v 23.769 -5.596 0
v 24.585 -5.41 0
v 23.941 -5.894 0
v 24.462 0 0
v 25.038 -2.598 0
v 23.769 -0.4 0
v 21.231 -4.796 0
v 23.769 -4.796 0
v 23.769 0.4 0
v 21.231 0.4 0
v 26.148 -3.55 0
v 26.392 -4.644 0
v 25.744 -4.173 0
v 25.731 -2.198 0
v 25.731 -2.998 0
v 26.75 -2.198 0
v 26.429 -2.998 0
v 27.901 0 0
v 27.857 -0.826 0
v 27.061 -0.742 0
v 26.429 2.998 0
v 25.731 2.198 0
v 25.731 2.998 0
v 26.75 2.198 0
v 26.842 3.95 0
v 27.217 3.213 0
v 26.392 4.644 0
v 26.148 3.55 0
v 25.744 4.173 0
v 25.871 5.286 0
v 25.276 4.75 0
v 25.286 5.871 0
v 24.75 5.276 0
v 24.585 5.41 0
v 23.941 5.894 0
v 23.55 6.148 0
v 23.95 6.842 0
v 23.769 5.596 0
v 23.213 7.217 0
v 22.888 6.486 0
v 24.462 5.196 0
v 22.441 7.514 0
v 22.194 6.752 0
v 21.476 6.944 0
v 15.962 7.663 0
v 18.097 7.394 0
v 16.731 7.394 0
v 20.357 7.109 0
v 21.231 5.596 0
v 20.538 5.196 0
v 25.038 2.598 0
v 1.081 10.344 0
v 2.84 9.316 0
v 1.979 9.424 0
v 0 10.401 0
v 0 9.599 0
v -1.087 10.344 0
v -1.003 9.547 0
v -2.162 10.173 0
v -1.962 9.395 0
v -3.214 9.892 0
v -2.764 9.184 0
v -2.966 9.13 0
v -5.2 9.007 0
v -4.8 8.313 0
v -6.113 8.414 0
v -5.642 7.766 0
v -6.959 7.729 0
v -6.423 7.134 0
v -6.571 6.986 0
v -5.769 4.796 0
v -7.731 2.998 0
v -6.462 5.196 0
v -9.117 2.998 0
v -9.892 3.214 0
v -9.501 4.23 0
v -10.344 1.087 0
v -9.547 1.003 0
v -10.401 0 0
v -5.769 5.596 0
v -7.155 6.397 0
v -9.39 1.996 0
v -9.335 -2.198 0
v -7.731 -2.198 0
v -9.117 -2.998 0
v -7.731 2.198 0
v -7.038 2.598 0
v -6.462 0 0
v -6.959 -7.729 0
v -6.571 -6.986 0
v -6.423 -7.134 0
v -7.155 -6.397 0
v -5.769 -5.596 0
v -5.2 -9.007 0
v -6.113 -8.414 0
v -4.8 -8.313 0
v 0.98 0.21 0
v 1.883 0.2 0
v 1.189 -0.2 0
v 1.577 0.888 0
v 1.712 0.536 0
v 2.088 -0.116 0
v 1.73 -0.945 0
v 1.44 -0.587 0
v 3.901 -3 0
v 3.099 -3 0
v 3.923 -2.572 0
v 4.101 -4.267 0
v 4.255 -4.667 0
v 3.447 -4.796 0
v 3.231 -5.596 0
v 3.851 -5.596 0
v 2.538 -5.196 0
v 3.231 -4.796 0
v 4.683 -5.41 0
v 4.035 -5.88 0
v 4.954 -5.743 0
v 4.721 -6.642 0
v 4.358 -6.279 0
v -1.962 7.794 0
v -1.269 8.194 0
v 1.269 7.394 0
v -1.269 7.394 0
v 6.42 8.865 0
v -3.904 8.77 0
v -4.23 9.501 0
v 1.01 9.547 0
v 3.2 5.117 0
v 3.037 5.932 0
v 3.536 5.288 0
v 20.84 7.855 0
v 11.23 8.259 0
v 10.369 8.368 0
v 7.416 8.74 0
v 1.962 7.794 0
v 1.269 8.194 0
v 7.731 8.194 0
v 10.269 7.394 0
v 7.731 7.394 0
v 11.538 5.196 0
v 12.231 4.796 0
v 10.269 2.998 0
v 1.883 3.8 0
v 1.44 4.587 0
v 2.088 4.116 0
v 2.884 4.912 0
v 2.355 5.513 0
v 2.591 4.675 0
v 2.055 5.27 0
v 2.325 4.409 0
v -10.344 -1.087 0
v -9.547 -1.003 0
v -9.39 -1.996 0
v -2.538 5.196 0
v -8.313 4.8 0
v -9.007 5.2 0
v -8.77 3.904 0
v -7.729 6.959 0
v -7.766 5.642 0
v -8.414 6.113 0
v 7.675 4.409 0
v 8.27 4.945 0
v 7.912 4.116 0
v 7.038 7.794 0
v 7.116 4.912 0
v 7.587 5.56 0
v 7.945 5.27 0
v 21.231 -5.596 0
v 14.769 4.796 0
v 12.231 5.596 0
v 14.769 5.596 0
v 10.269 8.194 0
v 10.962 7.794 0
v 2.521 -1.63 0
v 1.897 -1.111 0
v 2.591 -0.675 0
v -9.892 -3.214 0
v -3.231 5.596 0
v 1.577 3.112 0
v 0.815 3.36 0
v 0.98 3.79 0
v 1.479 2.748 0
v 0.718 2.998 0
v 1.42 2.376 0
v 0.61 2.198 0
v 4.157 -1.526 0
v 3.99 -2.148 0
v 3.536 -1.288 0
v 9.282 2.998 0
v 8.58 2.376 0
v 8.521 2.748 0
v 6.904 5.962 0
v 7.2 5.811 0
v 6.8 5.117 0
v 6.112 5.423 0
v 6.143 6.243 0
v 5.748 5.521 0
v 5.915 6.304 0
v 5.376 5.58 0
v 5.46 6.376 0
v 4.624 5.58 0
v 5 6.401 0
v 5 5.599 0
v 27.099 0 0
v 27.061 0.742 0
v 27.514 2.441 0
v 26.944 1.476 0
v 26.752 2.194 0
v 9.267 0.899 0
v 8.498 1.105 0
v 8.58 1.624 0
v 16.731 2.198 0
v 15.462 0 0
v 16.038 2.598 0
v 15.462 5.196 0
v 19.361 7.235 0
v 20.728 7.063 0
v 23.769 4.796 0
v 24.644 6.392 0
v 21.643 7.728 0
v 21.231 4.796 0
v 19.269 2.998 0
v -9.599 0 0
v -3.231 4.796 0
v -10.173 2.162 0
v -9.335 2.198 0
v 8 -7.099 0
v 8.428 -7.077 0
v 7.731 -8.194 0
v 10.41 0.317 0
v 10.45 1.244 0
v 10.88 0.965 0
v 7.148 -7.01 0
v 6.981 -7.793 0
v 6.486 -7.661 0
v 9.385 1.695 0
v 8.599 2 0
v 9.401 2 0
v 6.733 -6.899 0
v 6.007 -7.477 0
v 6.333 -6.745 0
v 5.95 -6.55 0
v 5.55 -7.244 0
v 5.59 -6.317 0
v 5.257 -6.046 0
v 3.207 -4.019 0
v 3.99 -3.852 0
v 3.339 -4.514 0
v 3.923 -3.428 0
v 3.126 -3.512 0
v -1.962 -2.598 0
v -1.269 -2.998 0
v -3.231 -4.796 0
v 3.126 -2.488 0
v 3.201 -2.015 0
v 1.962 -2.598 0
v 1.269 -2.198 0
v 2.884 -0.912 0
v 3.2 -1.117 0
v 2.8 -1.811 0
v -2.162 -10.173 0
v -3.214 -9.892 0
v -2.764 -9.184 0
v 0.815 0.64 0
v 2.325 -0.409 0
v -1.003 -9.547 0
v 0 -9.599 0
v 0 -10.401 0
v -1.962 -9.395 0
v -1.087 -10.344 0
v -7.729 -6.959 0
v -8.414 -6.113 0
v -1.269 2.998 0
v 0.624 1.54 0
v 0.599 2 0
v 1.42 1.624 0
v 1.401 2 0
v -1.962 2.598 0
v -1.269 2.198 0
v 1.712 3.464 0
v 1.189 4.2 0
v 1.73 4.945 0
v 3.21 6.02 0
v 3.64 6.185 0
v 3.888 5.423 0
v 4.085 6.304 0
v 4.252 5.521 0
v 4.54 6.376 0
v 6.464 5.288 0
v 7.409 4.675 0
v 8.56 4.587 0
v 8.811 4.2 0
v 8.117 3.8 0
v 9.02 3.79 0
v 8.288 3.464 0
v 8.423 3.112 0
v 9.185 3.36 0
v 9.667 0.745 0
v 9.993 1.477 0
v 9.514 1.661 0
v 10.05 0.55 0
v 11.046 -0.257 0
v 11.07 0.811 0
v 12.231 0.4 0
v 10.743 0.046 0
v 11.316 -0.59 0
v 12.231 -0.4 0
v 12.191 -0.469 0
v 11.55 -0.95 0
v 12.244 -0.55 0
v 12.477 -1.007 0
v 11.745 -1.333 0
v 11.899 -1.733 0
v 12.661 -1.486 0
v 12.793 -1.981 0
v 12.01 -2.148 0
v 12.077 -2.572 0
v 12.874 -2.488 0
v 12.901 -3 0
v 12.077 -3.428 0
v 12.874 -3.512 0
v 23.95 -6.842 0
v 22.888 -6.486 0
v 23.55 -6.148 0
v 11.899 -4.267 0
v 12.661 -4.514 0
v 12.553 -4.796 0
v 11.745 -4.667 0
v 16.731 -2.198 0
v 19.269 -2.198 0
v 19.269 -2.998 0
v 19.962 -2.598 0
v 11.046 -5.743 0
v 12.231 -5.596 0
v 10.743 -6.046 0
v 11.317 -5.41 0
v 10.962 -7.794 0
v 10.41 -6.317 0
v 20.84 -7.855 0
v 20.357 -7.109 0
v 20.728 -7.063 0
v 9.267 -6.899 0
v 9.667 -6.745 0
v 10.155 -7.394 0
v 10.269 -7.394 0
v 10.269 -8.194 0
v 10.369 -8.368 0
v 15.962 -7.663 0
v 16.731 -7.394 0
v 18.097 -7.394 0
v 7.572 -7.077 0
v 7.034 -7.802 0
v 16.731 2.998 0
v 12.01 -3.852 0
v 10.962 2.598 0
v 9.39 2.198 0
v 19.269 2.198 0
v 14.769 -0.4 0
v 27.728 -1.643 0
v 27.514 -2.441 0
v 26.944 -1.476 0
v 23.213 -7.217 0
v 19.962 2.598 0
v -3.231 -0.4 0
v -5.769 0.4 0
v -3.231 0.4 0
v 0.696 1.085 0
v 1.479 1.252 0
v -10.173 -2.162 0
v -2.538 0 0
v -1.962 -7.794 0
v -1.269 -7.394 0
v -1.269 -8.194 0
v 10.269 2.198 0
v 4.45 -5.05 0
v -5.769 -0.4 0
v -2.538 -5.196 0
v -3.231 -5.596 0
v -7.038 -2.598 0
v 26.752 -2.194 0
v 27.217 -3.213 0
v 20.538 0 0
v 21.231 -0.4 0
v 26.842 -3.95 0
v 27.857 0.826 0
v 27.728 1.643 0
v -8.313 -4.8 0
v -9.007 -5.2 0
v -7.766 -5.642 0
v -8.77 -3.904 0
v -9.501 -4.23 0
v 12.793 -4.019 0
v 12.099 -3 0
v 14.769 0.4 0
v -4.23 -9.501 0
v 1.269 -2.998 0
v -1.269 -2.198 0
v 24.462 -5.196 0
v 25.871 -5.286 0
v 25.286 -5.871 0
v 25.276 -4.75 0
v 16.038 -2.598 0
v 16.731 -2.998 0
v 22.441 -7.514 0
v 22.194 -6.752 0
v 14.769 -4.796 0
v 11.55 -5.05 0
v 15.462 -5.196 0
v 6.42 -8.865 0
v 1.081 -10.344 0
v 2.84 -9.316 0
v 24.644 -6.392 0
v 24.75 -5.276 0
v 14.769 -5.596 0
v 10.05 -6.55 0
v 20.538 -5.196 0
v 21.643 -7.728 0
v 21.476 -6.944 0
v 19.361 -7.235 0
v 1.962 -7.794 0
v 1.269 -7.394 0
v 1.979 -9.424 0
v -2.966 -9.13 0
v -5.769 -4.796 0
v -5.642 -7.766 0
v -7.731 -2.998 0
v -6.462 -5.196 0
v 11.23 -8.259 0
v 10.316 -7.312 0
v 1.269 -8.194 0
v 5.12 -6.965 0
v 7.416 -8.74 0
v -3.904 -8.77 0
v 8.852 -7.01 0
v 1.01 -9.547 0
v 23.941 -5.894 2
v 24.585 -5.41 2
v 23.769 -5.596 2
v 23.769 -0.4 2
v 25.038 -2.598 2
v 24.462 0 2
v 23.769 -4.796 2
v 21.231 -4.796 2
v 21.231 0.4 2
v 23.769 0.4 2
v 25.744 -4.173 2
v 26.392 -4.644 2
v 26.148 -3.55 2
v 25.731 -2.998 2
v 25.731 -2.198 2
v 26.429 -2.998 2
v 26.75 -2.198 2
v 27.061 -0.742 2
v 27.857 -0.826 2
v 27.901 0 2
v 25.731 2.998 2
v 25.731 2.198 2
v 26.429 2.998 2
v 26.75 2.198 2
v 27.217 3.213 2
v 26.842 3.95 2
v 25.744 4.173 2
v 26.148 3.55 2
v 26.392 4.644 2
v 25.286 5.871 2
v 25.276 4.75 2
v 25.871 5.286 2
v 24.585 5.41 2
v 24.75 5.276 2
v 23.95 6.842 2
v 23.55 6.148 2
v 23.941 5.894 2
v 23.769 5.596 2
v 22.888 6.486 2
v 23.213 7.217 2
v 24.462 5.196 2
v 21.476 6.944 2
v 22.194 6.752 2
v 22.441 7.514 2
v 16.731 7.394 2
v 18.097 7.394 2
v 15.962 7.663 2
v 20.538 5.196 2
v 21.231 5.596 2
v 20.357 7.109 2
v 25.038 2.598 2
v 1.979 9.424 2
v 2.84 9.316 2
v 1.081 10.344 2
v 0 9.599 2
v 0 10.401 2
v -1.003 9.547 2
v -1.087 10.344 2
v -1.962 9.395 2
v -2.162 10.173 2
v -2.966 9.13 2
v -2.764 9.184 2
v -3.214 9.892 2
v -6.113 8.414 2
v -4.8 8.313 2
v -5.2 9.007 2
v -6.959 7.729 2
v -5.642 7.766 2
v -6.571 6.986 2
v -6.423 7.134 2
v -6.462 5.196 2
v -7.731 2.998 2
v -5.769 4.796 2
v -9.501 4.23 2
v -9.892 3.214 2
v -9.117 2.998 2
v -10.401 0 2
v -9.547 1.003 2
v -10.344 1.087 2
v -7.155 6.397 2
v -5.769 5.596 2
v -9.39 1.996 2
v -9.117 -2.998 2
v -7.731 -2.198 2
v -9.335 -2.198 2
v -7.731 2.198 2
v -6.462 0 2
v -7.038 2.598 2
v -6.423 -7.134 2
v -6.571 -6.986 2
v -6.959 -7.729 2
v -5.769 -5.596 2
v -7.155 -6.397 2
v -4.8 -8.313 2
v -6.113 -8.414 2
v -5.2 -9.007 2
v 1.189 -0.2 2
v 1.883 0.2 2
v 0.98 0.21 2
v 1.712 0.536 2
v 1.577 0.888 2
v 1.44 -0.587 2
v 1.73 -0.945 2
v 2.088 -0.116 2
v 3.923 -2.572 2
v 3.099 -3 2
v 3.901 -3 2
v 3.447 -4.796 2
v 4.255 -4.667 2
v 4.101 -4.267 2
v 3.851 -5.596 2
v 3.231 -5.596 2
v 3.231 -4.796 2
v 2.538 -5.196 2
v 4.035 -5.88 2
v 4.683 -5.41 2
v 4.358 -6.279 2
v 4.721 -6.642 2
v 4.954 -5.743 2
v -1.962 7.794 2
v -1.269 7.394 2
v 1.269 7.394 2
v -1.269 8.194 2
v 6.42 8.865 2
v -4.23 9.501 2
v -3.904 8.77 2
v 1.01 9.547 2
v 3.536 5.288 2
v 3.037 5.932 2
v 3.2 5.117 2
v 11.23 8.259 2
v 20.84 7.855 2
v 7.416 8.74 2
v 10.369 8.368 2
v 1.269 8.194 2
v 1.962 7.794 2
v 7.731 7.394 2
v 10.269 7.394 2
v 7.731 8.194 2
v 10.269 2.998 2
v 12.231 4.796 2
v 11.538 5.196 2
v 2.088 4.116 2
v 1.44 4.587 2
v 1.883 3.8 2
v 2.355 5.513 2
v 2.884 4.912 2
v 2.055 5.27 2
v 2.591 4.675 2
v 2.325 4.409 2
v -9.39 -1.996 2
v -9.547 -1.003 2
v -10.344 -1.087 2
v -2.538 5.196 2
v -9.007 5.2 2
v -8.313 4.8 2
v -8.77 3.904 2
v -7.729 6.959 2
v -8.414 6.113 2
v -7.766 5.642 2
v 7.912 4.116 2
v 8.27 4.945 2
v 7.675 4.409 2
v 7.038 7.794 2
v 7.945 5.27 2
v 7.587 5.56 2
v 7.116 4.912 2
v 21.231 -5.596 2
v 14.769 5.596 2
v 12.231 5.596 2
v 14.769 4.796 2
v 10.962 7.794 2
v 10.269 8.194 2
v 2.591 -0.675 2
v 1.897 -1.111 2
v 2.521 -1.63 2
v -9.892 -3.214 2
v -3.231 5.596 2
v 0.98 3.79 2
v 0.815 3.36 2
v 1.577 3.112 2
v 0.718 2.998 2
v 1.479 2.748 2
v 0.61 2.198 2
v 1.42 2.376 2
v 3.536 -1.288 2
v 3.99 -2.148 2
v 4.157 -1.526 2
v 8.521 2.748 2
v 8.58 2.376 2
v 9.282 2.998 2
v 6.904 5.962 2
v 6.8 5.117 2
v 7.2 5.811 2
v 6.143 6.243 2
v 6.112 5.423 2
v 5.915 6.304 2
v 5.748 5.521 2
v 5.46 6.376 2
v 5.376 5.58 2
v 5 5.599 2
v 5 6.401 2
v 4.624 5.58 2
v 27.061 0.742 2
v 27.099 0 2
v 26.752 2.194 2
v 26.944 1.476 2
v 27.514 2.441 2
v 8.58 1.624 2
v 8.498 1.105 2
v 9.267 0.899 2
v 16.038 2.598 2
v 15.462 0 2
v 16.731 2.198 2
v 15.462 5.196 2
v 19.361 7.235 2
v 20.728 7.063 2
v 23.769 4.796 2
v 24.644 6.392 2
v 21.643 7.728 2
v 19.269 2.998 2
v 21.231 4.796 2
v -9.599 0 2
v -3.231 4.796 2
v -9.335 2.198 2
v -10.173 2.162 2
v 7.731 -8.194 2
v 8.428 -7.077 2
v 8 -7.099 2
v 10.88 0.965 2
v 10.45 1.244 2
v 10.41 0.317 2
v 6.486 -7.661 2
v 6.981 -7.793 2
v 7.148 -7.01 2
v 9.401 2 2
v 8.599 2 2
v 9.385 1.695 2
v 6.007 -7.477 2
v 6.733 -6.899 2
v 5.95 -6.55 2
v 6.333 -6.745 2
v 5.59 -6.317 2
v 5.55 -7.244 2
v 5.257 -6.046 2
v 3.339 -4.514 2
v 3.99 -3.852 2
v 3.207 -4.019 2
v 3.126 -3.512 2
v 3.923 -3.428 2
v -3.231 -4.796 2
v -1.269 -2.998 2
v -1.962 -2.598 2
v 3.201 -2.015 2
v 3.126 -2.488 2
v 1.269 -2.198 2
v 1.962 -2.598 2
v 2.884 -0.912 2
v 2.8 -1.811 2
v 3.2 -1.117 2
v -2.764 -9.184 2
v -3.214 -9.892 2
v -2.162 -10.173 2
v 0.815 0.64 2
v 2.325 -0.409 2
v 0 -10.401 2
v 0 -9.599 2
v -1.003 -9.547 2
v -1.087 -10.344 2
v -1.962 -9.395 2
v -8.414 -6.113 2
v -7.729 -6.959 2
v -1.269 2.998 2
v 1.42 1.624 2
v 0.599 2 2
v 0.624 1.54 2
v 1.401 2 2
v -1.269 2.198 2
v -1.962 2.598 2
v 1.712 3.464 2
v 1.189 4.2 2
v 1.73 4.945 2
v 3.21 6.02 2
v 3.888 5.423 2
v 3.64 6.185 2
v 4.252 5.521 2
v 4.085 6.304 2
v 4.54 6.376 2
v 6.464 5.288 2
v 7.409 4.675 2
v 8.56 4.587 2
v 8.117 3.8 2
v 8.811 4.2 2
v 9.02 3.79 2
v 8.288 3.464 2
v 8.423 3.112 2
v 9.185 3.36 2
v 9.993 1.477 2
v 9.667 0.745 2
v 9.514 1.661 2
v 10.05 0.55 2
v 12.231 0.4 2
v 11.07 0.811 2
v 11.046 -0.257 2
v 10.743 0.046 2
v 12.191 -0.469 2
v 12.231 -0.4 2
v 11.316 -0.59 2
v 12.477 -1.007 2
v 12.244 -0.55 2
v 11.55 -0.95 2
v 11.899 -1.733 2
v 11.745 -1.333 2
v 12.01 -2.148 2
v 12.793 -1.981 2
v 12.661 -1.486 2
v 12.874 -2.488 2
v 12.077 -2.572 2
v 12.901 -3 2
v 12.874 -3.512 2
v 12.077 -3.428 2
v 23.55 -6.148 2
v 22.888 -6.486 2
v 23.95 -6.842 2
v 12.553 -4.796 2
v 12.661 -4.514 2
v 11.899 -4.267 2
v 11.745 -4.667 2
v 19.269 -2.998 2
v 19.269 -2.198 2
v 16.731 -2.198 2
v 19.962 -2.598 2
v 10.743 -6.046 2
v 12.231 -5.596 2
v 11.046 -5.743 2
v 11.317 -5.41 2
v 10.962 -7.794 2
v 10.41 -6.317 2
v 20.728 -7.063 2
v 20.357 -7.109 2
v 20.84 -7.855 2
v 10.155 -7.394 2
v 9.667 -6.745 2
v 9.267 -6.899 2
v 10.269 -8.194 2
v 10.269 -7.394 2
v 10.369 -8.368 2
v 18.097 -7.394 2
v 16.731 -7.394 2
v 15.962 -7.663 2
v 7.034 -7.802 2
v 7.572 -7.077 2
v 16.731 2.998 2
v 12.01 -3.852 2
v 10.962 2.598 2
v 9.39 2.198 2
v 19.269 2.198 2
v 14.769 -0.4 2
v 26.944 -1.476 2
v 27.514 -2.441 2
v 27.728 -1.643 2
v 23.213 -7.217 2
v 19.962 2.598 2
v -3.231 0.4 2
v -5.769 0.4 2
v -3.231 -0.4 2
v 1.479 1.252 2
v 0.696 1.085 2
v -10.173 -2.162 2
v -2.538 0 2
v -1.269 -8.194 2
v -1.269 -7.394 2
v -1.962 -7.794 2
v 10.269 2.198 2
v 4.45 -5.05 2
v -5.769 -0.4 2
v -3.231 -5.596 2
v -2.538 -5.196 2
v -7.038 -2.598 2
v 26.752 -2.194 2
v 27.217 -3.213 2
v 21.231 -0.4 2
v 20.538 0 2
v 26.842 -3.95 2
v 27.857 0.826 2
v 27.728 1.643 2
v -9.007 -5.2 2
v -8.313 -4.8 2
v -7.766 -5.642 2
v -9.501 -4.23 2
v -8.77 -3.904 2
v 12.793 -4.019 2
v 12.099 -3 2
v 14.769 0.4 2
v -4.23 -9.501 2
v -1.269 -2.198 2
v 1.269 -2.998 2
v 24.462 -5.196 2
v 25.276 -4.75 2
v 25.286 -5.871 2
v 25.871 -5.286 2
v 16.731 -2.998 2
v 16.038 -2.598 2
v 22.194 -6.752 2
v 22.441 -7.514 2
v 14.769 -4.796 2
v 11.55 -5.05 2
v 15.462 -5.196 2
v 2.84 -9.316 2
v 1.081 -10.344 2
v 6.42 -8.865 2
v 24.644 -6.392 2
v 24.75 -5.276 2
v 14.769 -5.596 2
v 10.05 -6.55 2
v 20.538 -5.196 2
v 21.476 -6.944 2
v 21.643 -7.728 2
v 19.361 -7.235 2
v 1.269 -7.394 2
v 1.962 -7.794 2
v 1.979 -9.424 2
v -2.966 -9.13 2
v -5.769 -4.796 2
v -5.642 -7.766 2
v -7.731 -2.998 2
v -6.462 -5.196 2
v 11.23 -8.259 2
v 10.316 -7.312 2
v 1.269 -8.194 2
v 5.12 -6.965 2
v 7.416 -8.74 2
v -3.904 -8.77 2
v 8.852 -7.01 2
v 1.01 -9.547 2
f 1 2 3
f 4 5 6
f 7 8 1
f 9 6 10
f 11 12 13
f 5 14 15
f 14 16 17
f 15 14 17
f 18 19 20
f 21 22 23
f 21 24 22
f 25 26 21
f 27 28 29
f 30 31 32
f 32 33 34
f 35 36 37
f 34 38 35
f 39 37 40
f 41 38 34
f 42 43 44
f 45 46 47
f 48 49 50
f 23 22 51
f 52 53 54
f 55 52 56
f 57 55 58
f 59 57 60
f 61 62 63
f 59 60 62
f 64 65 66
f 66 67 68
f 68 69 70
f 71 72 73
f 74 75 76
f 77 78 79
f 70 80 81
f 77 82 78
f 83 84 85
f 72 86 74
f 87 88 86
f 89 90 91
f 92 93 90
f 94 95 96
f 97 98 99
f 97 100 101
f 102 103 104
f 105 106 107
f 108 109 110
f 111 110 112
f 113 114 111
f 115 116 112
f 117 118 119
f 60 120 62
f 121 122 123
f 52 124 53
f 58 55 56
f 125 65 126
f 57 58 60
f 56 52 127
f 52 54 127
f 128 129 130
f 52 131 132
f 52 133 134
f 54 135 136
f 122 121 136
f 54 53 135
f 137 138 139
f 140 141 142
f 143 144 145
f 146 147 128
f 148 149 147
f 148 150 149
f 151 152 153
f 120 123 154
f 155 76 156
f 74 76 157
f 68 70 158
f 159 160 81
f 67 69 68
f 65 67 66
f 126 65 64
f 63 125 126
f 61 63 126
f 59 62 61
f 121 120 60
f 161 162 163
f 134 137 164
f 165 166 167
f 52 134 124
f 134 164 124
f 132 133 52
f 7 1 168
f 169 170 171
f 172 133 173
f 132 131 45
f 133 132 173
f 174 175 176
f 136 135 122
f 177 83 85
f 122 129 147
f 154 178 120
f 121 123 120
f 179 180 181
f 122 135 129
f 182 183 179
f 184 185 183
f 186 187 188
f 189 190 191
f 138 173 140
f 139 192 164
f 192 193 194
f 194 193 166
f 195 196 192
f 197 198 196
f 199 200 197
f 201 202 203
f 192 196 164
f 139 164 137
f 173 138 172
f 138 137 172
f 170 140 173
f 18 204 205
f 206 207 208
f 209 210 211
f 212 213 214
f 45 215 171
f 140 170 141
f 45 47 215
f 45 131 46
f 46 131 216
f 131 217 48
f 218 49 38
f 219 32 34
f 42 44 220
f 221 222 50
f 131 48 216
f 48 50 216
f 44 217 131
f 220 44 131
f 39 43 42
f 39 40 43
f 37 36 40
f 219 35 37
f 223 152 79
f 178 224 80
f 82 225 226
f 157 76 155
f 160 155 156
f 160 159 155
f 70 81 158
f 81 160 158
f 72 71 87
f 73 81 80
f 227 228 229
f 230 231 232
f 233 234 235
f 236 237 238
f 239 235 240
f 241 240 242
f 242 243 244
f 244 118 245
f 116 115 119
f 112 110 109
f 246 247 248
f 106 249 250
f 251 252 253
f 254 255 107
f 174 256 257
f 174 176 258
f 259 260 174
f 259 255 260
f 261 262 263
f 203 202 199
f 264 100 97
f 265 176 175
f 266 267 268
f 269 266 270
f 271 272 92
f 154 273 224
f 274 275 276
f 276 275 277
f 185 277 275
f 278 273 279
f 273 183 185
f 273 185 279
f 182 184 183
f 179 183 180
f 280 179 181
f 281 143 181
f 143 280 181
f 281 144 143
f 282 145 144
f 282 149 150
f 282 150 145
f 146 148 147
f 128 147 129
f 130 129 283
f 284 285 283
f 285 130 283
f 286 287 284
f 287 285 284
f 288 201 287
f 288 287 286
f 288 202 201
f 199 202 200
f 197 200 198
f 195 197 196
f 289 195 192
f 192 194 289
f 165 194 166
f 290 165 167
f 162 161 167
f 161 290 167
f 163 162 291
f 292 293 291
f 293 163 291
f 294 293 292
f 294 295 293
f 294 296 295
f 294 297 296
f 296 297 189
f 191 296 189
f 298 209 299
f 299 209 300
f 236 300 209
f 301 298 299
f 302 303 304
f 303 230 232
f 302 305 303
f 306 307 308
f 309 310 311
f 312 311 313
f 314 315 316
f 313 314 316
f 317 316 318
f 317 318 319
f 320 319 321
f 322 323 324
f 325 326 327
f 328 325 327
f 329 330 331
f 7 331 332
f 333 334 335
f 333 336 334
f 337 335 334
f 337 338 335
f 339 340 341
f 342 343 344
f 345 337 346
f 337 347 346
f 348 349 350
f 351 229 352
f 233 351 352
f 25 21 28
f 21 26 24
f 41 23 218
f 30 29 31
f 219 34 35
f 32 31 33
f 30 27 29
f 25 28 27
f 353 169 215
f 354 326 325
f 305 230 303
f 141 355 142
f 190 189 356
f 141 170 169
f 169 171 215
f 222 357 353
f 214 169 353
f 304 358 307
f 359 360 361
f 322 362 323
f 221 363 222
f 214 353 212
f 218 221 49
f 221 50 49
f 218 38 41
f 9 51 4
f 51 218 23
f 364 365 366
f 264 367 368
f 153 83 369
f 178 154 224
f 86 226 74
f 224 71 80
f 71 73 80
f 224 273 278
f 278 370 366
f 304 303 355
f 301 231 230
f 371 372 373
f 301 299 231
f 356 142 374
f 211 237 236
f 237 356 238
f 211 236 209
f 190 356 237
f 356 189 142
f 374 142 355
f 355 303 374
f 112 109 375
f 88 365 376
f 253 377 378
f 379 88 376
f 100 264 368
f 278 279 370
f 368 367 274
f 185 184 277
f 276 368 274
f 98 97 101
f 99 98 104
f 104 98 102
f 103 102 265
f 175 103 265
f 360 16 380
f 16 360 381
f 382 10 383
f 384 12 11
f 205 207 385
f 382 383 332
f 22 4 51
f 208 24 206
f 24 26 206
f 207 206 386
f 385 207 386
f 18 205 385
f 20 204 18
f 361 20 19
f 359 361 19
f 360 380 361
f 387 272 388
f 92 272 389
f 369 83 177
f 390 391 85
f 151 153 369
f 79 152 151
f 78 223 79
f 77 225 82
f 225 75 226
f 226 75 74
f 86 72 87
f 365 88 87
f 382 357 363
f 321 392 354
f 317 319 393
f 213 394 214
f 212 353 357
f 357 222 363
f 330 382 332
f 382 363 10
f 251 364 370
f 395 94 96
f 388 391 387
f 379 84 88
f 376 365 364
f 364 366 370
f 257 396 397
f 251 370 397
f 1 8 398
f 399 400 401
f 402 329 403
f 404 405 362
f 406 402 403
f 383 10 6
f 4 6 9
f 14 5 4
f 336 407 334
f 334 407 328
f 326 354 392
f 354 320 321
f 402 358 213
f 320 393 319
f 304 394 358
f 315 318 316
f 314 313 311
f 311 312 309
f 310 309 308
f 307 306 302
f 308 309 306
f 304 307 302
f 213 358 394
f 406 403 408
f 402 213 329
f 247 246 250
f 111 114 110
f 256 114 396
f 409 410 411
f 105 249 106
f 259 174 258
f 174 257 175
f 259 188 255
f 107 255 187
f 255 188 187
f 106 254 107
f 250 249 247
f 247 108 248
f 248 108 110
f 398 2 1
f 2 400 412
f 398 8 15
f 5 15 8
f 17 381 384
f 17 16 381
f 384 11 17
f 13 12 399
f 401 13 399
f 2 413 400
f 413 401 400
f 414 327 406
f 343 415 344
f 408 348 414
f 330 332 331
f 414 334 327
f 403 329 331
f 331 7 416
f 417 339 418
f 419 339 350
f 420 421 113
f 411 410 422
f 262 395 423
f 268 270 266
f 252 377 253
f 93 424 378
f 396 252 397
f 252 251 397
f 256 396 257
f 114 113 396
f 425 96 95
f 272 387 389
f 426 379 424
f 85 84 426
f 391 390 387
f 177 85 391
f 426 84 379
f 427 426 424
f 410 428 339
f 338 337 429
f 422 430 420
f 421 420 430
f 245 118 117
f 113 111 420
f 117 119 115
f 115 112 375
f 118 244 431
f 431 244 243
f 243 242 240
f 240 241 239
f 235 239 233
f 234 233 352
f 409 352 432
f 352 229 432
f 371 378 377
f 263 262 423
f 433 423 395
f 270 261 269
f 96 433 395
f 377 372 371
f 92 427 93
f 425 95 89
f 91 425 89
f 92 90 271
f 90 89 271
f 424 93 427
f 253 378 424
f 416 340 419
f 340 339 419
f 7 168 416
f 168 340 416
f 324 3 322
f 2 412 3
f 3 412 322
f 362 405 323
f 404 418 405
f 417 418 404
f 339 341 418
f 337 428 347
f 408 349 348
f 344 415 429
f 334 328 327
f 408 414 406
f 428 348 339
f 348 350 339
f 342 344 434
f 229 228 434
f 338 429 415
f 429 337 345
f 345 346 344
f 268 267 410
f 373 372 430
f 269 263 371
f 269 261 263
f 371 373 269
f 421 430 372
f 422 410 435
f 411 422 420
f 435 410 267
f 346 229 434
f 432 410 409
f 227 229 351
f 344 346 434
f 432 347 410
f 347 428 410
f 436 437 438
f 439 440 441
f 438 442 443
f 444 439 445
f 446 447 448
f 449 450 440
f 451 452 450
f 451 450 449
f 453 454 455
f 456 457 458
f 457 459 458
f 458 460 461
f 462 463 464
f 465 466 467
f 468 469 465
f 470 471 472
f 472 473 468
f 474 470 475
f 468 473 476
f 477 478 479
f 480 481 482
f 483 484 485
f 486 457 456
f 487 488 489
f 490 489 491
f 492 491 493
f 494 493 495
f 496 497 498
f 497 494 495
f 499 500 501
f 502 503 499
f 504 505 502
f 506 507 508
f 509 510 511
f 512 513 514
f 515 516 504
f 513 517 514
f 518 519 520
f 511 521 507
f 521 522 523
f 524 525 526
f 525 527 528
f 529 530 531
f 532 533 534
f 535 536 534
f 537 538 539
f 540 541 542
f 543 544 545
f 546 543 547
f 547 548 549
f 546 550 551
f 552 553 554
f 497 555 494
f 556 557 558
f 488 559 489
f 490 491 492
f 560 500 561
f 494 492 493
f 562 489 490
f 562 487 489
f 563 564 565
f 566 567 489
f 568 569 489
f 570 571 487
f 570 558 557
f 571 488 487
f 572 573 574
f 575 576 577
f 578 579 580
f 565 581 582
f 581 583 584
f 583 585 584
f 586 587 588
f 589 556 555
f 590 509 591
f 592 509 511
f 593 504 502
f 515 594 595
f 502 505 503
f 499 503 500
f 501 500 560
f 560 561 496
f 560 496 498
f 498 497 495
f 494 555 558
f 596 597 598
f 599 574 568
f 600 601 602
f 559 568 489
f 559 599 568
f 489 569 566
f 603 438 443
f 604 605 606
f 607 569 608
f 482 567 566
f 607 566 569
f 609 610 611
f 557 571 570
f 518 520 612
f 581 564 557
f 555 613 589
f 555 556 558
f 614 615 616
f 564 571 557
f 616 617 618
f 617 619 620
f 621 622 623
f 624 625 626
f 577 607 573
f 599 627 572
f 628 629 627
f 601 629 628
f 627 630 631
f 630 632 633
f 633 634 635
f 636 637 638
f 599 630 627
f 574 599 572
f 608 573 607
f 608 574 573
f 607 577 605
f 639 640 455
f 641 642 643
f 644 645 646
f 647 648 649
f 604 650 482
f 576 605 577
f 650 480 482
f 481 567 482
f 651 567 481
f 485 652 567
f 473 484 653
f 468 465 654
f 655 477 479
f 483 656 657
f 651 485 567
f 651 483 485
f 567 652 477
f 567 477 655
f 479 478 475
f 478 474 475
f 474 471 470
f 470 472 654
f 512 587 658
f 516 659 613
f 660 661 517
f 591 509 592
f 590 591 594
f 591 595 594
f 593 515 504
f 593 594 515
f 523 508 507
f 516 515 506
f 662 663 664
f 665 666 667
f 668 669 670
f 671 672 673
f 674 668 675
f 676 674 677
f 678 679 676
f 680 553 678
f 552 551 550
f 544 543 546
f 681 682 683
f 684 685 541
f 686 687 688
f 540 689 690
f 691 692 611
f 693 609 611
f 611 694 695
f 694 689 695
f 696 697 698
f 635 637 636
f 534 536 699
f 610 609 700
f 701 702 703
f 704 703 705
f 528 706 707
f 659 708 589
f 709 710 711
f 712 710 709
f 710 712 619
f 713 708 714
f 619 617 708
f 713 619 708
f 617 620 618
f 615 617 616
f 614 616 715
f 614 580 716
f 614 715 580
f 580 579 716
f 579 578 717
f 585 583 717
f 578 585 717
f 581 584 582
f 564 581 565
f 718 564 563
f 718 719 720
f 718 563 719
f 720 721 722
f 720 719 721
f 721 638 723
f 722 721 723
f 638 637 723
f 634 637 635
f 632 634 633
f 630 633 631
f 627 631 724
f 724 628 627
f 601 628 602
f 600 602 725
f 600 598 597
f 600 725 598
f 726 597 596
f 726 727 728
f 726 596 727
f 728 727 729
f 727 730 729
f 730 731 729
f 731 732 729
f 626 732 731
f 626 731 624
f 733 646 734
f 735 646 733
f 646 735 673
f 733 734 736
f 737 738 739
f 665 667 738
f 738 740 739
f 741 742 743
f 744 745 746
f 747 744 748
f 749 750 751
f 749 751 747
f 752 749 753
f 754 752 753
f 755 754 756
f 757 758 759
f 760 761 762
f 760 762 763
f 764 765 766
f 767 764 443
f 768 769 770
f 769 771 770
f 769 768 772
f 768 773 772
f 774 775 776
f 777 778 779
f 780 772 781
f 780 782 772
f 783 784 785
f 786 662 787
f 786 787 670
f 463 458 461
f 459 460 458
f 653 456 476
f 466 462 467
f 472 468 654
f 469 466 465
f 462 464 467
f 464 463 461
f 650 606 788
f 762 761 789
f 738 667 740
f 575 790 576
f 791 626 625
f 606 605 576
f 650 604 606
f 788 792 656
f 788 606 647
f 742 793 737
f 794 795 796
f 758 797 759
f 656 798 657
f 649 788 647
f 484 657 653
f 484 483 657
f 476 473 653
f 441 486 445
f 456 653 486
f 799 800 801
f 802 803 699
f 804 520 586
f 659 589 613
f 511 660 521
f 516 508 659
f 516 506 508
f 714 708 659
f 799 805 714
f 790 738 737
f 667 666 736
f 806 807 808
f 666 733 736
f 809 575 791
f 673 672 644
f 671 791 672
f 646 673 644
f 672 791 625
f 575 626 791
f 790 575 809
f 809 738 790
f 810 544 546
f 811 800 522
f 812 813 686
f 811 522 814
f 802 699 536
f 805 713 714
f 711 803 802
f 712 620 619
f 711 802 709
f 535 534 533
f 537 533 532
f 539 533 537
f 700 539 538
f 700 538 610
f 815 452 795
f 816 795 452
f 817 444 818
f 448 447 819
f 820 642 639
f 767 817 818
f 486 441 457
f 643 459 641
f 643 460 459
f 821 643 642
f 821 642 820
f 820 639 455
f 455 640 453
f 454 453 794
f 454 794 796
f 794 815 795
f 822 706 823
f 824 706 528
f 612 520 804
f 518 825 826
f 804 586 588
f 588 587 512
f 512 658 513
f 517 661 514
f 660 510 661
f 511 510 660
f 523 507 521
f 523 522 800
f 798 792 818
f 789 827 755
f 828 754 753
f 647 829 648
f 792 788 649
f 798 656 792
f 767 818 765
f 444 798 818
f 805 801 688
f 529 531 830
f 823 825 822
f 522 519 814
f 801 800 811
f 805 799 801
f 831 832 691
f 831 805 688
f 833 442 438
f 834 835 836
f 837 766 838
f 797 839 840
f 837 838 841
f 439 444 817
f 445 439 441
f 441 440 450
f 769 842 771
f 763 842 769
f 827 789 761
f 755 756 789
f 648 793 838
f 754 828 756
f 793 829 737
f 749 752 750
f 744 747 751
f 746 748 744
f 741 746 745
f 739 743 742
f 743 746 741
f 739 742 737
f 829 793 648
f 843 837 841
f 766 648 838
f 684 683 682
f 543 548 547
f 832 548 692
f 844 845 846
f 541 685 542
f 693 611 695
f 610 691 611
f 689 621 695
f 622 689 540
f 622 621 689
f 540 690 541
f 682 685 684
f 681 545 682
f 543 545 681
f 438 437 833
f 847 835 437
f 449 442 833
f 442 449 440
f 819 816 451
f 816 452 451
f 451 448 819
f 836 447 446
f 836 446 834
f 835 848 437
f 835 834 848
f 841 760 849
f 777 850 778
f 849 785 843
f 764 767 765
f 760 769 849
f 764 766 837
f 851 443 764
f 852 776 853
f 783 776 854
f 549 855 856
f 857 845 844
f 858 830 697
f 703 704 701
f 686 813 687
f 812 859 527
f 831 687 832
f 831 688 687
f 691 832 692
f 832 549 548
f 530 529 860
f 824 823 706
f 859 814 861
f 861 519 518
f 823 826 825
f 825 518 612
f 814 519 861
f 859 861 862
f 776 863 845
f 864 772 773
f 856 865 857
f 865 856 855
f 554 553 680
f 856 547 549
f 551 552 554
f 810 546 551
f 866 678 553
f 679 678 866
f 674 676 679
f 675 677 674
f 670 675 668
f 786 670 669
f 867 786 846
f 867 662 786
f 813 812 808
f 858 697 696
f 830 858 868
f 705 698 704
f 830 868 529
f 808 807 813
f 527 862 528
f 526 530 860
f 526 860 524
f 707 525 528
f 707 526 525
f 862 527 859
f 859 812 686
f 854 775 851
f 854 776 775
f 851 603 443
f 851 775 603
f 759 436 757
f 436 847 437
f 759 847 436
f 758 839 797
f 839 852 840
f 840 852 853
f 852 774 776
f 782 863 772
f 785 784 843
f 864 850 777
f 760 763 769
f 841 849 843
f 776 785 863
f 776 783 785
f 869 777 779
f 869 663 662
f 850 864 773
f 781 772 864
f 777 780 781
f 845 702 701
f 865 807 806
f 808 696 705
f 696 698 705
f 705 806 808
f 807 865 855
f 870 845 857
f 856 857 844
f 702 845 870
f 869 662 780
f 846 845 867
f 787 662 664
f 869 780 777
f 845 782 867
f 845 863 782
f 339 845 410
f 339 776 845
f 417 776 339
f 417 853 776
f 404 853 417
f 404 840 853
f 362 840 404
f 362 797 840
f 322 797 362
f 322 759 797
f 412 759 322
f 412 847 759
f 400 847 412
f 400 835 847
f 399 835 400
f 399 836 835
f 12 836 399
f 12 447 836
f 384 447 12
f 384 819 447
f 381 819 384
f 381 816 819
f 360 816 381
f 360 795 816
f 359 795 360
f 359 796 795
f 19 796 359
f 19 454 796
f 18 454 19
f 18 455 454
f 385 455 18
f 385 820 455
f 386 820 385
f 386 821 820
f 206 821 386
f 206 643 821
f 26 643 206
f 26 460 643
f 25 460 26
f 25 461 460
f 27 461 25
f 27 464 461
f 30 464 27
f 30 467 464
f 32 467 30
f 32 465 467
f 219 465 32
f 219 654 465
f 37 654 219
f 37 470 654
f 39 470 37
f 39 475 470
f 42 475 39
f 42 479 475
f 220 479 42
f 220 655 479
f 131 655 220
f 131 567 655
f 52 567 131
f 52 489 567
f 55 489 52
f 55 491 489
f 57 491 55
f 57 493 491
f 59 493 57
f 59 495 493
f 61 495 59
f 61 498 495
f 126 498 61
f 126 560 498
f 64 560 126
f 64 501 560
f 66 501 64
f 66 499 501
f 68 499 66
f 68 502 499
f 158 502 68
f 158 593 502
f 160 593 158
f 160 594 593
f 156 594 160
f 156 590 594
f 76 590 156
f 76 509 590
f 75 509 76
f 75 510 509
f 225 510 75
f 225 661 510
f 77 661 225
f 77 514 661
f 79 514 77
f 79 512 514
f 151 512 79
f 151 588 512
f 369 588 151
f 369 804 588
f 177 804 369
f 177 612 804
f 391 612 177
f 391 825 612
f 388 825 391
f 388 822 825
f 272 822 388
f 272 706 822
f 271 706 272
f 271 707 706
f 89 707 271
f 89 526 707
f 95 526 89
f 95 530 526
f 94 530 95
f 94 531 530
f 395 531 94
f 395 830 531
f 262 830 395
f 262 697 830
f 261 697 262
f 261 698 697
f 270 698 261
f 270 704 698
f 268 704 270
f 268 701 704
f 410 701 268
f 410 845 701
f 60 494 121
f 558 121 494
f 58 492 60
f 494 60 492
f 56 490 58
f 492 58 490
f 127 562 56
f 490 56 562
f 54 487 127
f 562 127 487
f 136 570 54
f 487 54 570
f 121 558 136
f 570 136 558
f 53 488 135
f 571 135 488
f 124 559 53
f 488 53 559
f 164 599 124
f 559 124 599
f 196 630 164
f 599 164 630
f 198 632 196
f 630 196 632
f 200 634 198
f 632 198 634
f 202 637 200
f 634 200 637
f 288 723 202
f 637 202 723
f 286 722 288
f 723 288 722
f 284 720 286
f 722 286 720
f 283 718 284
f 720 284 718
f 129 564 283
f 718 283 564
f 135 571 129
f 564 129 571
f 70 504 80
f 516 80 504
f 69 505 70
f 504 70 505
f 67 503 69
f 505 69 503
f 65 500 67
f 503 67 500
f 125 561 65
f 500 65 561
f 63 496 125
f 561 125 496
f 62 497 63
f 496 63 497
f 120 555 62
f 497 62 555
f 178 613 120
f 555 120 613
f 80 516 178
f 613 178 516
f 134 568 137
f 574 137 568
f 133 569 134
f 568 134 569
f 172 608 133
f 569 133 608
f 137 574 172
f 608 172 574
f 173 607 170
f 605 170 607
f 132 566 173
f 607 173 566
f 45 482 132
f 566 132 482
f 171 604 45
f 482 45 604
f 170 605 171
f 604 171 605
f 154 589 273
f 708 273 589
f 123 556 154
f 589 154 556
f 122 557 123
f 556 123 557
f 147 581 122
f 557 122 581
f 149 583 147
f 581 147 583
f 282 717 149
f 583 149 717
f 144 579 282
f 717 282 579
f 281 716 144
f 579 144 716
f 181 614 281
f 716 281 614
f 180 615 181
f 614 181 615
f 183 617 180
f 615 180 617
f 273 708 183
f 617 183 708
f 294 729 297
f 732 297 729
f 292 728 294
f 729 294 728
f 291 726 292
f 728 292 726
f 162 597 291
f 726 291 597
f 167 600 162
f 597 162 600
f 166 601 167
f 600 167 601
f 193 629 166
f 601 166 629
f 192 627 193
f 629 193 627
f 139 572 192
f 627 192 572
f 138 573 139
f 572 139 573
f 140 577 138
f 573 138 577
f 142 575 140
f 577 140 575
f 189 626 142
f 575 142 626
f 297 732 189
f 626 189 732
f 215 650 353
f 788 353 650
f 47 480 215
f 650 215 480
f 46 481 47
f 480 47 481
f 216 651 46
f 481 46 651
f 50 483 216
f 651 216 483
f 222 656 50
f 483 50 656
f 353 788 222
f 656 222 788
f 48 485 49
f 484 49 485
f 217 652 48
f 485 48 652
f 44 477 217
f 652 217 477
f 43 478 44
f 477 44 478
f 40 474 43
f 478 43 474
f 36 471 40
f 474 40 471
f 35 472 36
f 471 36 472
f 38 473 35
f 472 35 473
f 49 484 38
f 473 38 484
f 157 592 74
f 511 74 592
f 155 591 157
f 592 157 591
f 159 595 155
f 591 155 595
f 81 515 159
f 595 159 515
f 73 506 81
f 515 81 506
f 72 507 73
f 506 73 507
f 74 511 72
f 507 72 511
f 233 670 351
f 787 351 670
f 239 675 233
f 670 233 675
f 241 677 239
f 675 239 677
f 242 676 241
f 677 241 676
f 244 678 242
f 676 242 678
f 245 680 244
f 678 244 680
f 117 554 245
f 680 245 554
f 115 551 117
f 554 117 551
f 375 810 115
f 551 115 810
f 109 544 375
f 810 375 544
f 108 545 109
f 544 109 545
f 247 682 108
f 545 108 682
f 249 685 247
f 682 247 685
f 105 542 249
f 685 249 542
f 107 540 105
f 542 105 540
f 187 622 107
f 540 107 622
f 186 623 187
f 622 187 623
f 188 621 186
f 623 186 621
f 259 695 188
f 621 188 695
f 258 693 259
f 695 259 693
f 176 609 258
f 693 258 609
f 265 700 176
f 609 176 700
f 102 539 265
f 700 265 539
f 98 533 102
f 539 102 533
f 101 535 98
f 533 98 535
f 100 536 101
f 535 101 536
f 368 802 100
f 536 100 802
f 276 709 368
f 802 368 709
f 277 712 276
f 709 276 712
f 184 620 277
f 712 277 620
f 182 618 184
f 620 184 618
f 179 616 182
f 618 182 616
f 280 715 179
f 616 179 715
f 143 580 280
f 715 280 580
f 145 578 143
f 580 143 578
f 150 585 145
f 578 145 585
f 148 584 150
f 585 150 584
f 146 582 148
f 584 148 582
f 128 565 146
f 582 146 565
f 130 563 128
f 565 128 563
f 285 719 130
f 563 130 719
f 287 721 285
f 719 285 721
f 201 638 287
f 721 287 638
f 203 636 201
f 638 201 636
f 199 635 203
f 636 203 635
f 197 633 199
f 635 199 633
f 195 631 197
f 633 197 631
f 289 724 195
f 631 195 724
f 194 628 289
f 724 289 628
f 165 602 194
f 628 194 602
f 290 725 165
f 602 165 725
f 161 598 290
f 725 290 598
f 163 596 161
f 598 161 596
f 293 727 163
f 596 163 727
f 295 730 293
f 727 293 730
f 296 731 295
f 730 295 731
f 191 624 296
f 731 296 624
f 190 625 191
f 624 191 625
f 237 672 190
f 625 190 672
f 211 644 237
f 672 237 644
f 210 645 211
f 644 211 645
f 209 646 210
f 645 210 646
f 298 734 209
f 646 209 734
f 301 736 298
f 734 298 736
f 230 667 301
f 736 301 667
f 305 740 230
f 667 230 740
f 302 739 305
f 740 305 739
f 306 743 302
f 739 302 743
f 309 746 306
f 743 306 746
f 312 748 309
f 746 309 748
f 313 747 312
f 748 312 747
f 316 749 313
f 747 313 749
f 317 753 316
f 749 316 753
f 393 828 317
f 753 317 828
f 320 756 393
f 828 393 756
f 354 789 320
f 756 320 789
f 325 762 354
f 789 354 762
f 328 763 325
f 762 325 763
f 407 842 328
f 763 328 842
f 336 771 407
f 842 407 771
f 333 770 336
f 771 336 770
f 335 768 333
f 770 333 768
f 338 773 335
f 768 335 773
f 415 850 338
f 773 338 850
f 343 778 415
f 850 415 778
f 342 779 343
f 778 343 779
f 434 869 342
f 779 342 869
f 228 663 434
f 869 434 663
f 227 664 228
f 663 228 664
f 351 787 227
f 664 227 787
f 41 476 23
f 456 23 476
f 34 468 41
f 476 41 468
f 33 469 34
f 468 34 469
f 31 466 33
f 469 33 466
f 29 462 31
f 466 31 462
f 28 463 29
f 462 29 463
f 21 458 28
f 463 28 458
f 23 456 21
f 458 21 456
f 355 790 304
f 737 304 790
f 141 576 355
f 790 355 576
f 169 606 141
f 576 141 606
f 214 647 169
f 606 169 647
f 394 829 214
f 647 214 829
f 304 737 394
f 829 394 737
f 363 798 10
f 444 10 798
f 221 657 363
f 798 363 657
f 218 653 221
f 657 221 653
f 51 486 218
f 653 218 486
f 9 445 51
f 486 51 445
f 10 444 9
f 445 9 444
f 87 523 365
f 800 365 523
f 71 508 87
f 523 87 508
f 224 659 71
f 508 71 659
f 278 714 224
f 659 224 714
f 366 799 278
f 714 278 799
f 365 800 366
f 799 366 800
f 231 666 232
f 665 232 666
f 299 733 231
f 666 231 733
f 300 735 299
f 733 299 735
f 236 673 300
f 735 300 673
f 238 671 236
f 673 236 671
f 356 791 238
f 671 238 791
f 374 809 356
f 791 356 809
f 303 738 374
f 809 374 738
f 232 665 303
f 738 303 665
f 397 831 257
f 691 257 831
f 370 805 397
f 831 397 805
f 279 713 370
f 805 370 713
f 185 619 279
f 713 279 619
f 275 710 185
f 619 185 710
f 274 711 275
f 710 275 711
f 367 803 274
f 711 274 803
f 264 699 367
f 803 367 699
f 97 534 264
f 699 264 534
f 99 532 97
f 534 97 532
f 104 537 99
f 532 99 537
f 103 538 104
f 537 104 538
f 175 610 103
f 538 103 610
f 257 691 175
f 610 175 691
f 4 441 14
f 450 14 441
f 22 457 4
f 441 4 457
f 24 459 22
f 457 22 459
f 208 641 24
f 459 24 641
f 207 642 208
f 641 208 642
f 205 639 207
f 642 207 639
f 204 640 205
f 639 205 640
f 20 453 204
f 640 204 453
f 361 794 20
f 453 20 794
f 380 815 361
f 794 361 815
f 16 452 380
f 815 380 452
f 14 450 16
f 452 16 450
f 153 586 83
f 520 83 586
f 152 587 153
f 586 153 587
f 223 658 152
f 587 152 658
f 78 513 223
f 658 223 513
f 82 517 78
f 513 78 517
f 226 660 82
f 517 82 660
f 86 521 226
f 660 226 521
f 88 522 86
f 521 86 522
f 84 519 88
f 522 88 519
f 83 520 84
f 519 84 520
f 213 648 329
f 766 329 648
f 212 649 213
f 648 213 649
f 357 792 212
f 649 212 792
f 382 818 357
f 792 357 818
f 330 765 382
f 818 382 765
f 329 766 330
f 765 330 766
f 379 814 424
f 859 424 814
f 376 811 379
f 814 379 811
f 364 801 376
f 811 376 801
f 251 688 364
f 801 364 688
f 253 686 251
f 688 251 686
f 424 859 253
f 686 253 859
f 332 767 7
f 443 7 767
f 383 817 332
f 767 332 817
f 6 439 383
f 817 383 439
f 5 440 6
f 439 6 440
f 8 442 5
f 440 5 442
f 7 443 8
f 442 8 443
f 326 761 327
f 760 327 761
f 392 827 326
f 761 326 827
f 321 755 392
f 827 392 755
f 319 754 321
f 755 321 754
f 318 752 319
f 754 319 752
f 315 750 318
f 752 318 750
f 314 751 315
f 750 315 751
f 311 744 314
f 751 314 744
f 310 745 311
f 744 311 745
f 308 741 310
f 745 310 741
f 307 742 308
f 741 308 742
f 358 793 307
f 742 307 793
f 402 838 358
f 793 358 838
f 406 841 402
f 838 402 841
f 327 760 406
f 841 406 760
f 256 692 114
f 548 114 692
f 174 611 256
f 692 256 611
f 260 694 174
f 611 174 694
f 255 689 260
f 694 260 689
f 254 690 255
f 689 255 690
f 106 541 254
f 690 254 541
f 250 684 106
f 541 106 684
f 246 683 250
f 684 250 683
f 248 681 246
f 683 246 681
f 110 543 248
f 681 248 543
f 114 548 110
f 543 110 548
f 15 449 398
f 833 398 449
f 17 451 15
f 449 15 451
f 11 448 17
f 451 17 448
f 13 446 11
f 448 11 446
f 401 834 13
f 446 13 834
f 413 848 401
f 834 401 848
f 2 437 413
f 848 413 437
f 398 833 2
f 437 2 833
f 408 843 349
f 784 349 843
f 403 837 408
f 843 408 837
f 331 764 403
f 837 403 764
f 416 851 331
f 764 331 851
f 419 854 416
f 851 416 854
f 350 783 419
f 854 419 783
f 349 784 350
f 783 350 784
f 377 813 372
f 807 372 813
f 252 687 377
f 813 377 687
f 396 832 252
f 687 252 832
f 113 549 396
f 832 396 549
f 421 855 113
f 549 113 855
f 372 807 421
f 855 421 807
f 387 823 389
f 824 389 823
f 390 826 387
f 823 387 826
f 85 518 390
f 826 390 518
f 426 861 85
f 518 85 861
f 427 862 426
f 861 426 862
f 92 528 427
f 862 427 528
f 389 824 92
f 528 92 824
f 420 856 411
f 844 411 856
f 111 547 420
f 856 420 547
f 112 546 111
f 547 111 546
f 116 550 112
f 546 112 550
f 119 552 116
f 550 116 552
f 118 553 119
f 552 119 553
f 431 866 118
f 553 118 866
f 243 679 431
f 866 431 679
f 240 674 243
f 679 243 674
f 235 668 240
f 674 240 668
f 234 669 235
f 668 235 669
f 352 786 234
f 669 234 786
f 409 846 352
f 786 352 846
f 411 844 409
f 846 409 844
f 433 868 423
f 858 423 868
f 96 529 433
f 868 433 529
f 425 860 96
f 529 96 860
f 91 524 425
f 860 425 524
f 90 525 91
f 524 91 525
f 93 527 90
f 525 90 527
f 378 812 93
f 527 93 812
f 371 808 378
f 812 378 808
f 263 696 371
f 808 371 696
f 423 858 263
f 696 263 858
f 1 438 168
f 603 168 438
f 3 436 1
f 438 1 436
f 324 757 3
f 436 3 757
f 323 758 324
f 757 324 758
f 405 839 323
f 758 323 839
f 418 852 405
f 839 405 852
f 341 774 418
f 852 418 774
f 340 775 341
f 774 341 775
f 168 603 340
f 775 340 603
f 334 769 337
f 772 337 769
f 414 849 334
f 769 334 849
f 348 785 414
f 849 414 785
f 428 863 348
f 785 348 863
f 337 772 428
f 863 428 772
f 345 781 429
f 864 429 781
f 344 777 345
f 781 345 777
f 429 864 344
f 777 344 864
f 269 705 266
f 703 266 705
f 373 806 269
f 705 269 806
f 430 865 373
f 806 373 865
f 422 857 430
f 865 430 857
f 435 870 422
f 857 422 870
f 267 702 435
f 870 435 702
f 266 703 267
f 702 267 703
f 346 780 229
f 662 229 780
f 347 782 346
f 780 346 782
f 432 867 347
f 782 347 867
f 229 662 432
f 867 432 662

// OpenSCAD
module outline(th) {
    difference() {
        offset(delta= th/2) children();
        offset(delta=-th/2) children();
    }
}

module honeycomb(w, h, d, th, center=false) {
    dx = d * (1+cos(60));
    dy = d * cos(30);
    x0 = -floor(w/2/dx+0.5)*dx + (center ? 0 : w/2);
    y0 = -floor(h/2/dy+0.5)*dy + (center ? 0 : h/2);

    for (y=[y0:dy:y0+h]) {
        for (x=[x0:dx:x0+w]) {
            translate([x, y])
                outline(th) circle(d=d, $fn=6);
        }
    }
    for (y=[y0+dy/2:dy:y0+h]) {
        for (x=[x0+dx/2:dx:x0+w]) {
            translate([x, y])
                outline(th) circle(d=d, $fn=6);
        }
    }
}

module bounded_honeycomb(w, h, d, th, center=false) {
    intersection() {
        honeycomb(w, h, d, th, center);
        children();
    }
    outline(th) children();
}

$fn=60;
module test_plate() {
    linear_extrude(2, convexity=10) {
        difference() {
            bounded_honeycomb(80, 60, 6, 0.8, center=true) {
                hull() {
                    translate([ 0, 0]) circle(d=20);
                    translate([ 20, 0]) circle(d=15);
                }
            }
            children();
        }
        for (i=[0:$children-1]) outline(0.8) children(i);
    }
}

test_plate() {
    union() {
        translate([5, 2]) circle(d=8);
        translate([8, -3]) circle(d=9);
    }
}
